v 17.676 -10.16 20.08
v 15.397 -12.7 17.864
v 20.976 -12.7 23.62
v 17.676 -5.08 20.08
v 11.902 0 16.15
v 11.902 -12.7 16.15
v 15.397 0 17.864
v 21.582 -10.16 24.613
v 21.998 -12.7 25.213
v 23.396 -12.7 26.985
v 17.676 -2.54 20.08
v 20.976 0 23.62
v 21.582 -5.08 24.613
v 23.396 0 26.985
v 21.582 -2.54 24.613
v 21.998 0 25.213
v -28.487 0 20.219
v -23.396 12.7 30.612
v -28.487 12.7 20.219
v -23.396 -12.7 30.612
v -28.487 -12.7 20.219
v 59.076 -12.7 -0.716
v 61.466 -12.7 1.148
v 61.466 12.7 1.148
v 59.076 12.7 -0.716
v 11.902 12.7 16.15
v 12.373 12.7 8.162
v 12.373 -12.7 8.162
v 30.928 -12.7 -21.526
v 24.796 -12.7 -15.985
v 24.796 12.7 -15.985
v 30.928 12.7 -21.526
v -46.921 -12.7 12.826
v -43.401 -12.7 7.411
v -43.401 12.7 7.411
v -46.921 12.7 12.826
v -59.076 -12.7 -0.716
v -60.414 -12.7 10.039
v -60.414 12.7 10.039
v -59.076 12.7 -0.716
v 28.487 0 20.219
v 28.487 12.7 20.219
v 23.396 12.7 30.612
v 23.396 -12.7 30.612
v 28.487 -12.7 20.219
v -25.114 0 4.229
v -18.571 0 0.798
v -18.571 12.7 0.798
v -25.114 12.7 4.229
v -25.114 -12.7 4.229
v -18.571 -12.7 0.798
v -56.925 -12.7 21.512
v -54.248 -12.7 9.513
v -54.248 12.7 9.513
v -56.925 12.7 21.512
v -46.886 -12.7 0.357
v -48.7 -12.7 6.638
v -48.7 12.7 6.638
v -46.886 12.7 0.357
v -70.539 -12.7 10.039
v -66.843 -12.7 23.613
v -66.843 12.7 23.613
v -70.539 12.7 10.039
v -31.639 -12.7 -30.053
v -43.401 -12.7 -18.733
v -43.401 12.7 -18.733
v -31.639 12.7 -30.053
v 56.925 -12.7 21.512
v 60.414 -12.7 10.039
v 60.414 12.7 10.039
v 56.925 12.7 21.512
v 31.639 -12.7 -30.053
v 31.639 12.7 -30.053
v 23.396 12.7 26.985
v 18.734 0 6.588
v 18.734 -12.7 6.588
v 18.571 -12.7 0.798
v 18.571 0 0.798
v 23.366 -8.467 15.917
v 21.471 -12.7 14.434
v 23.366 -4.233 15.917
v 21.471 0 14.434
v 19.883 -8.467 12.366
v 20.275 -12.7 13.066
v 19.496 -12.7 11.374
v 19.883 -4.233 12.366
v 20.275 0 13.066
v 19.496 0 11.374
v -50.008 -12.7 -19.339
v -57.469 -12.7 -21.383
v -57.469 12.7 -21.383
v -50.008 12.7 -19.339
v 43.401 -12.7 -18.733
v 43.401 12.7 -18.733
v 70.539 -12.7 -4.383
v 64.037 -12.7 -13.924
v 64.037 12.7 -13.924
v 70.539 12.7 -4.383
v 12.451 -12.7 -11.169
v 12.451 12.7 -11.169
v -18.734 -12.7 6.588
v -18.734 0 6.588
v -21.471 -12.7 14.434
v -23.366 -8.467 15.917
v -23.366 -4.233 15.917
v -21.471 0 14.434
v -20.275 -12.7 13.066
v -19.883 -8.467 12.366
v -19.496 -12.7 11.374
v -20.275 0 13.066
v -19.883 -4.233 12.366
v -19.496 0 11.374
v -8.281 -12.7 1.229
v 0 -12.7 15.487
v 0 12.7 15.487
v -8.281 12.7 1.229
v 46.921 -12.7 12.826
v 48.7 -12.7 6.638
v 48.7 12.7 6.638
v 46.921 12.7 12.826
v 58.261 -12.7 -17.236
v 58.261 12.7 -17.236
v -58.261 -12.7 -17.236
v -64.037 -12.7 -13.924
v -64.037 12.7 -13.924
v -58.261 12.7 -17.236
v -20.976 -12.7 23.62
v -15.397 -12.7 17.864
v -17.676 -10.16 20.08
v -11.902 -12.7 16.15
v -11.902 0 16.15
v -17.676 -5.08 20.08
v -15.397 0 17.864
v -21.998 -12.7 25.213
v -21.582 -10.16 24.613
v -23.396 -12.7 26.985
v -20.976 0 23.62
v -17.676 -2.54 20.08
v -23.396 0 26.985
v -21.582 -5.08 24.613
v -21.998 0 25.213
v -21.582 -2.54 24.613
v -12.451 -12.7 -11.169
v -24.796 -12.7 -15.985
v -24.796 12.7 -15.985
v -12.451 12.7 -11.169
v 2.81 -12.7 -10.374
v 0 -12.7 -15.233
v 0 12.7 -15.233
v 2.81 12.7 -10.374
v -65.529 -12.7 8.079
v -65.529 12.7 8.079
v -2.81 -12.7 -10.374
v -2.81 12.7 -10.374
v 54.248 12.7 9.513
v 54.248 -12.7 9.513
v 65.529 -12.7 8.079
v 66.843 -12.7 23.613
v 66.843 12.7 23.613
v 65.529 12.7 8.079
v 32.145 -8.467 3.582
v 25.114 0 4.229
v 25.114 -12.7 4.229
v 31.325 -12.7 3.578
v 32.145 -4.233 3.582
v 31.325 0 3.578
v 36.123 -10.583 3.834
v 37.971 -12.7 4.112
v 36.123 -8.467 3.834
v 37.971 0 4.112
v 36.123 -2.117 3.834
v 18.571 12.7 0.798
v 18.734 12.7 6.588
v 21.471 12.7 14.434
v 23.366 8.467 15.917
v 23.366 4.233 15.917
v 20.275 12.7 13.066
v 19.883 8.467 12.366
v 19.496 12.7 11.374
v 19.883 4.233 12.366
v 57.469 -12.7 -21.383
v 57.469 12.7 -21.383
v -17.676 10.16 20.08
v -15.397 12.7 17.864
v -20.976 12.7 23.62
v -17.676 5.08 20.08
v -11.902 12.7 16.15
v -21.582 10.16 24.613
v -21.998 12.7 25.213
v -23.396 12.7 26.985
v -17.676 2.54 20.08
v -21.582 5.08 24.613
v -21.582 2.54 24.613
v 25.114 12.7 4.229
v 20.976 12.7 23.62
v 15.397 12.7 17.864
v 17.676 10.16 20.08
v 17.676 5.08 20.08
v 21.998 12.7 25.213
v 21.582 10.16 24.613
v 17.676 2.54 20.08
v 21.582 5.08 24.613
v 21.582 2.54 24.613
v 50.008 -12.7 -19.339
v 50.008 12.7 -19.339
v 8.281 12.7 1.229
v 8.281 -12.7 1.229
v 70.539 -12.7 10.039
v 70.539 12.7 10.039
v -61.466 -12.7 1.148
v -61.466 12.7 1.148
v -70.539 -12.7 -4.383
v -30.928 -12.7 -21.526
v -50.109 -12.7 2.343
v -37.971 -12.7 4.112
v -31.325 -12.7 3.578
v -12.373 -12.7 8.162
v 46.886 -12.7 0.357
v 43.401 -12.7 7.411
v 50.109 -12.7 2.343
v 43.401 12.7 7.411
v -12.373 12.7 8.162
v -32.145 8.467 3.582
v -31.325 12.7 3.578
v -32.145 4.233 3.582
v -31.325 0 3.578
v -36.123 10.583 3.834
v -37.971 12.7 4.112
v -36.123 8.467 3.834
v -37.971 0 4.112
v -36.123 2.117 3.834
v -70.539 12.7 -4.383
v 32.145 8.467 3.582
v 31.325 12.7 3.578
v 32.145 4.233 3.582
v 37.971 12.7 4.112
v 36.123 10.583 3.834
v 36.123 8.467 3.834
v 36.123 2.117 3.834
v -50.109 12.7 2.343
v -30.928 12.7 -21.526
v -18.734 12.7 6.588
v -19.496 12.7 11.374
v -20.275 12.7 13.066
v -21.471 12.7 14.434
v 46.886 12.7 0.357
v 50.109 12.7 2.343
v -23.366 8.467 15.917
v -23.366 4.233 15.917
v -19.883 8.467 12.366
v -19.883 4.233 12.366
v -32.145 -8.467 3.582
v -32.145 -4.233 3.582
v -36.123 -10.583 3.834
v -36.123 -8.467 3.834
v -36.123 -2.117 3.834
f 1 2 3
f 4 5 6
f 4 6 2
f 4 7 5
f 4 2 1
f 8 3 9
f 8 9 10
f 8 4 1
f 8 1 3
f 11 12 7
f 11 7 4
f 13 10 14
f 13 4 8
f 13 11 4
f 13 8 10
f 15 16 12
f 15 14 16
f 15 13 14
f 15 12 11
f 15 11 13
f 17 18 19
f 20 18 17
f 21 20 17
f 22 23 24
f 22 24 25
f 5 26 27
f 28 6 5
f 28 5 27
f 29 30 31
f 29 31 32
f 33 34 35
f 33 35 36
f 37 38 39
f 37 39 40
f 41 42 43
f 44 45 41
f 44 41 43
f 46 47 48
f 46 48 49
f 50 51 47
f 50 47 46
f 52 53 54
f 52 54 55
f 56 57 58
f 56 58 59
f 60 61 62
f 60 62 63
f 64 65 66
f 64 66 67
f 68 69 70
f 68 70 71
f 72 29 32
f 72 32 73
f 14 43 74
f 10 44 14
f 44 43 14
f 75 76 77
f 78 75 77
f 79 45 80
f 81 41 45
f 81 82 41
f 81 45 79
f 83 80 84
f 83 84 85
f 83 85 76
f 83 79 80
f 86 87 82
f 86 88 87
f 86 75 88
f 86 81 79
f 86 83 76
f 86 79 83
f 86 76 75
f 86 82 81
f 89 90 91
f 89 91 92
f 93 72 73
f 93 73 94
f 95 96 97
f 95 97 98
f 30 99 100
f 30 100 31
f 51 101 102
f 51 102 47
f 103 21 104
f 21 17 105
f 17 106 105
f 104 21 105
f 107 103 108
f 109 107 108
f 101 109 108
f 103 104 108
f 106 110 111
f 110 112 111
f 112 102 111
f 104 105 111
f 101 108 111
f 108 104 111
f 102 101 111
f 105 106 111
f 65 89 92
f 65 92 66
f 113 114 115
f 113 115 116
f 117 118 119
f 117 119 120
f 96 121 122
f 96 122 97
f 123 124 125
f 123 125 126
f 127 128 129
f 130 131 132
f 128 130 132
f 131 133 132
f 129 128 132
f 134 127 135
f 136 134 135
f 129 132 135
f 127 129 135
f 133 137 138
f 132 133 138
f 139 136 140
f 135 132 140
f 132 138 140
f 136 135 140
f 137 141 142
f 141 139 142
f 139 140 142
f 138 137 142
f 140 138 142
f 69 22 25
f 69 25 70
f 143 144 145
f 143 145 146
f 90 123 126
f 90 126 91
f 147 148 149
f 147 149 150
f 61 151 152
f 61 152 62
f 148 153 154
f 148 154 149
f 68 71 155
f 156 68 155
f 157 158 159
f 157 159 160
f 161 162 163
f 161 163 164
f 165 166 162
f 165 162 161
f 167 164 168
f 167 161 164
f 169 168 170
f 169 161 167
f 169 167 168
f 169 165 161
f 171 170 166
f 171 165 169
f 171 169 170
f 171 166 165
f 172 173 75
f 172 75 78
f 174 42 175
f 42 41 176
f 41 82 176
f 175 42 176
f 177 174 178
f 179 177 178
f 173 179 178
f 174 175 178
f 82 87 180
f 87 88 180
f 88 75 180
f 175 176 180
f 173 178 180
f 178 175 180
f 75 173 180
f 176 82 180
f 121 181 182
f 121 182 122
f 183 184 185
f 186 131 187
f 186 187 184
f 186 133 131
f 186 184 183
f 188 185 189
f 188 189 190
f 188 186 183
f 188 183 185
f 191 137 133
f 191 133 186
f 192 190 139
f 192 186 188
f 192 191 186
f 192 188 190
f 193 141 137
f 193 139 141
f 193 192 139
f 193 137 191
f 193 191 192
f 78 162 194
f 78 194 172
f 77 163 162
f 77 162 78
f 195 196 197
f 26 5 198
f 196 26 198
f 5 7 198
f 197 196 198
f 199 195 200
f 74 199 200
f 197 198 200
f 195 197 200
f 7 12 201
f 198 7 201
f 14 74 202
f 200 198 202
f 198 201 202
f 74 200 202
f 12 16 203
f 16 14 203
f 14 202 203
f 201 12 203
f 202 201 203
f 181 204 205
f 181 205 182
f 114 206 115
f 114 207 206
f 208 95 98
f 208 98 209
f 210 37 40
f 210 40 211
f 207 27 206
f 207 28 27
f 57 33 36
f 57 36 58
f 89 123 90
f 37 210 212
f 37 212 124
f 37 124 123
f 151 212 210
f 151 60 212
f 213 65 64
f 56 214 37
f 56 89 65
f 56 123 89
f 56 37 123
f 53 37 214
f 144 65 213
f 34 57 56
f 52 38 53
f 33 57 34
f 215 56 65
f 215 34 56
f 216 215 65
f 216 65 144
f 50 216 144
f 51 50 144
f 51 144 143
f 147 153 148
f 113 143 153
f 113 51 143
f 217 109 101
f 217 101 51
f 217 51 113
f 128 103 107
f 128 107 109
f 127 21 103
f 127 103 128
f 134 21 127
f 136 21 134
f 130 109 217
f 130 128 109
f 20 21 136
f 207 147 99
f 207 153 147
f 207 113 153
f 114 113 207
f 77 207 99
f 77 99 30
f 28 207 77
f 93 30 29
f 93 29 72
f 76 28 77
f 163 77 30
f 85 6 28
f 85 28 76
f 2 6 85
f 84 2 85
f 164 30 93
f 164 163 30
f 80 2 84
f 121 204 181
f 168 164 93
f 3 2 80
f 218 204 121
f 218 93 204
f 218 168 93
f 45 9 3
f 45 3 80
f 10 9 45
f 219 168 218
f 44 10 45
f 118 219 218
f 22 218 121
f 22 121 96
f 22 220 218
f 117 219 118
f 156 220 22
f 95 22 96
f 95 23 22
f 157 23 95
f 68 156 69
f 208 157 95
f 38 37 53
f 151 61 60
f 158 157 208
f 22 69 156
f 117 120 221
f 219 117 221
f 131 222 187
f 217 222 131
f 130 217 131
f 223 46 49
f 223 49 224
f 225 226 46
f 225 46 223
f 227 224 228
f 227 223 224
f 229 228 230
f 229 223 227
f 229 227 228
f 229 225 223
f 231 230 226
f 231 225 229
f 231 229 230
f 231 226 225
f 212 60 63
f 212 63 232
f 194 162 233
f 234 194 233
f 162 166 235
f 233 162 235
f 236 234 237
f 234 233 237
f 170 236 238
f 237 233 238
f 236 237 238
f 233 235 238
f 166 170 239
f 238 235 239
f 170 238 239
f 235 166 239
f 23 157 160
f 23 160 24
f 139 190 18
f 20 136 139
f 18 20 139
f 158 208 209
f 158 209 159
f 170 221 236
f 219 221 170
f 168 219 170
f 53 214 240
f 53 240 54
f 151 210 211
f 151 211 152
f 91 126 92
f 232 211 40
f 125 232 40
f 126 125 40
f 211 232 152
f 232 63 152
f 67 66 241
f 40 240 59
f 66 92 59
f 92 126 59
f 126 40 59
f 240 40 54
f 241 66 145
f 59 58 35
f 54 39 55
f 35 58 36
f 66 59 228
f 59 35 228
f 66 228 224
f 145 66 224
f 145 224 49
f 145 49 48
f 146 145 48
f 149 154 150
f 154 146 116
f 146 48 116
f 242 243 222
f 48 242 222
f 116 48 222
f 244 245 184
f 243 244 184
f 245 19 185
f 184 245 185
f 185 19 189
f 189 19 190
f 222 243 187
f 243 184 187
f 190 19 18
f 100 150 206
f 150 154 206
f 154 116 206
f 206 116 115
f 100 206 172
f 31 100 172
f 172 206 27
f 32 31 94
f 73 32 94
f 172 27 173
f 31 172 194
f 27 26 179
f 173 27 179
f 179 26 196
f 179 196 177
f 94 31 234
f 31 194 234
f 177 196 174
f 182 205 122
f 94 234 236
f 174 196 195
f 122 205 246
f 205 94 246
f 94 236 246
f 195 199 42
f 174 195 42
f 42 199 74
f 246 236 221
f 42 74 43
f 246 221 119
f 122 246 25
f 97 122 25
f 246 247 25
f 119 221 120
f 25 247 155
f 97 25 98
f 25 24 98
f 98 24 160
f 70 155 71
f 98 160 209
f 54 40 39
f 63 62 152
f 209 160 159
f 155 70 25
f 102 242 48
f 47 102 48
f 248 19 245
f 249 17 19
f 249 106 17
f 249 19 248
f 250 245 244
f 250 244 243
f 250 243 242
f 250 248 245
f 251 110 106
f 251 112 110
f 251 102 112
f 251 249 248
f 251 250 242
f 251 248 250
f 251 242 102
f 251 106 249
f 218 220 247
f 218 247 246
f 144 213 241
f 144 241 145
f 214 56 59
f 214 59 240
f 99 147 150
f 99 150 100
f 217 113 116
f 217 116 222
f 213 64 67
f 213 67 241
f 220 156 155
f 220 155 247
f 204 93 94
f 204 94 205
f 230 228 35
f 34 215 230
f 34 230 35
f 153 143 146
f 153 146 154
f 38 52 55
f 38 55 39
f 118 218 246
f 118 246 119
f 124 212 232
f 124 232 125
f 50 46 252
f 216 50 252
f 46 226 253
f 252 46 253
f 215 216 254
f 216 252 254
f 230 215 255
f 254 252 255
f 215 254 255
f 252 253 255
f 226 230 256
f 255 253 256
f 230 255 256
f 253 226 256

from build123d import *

# Parameters (mm, degrees)
F1_DEPTH = 12.7
F2_DEPTH = 12.7


with BuildPart() as f1:
    # F0 (on Front) → F1 (new body)
    with BuildSketch(Plane.XZ):
        with BuildLine():
            Line((8.2811145112, 1.2285960838), (0, 15.4874408618))
            Line((0, 15.4874408618), (-8.2811145112, 1.2285960838))
            Line((-8.2811145112, 1.2285960838), (-12.3727992177, 8.1617282704))
            Line((-12.3727992177, 8.1617282704), (-11.9023714215, 16.1495022476))
            add(Edge.make_bspline(
                [(-11.9023714215, 16.1495022476), (-13.1613517272, 16.6548575419), (-15.5670384726, 17.6205013473), (-17.5333922375, 20.1015797679), (-20.5609874273, 22.6867834573), (-21.4873396412, 24.6462285212), (-22.7265176962, 26.164892306), (-23.3956482261, 26.9849393517)],
                knots=[0, 0, 0, 0, 0.2204500858, 0.4212407827, 0.6411829959, 0.8062462362, 1, 1, 1, 1], degree=3))
            Line((-23.3956482261, 26.9849393517), (-23.3956482261, 30.6120049208))
            Line((-23.3956482261, 30.6120049208), (-28.4874904901, 20.2190671116))
            add(Edge.make_bspline(
                [(-28.4874904901, 20.2190671116), (-26.7351245713, 18.6815123537), (-23.471648253, 15.8180844094), (-18.698489342, 12.765512723), (-18.619259599, 5.307731901), (-18.5713469982, 0.7977882633)],
                knots=[0, 0, 0, 0, 0.3143060786, 0.5853403295, 1, 1, 1, 1], degree=3))
            Line((-18.5713469982, 0.7977882633), (-25.1141153276, 4.229309503))
            add(Edge.make_bspline(
                [(-25.1141153276, 4.229309503), (-27.2113543103, 3.8803000814), (-31.2175880029, 3.2136076751), (-38.0307467331, 4.0171950636), (-37.9710688228, 4.111548475), (-37.9713065922, 4.1118925437)],
                knots=[0, 0, 0, 0, 0.5026791859, 0.9602388224, 0.9760311652, 0.9760311652, 0.9760311652, 0.9760311652], degree=3))
            Line((-37.9713065922, 4.1118925437), (-43.4008166194, 7.4114357121))
            Line((-43.4008166194, 7.4114357121), (-46.9205416739, 12.8263989463))
            Line((-46.9205416739, 12.8263989463), (-48.6997440457, 6.6378694028))
            Line((-48.6997440457, 6.6378694028), (-46.8862317502, 0.3569243418))
            Line((-46.8862317502, 0.3569243418), (-50.1090995967, 2.34253495))
            Line((-50.1090995967, 2.34253495), (-54.2478188872, 9.5133557916))
            Line((-54.2478188872, 9.5133557916), (-56.9247491658, 21.5117353946))
            Line((-56.9247491658, 21.5117353946), (-60.4143179953, 10.0391805172))
            Line((-60.4143179953, 10.0391805172), (-59.0758509934, -0.716338749))
            Line((-59.0758509934, -0.716338749), (-61.4659674466, 1.1479511159))
            Line((-61.4659674466, 1.1479511159), (-65.5291676521, 8.0792857334))
            Line((-65.5291676521, 8.0792857334), (-66.8426156044, 23.612709716))
            Line((-66.8426156044, 23.612709716), (-70.5394372344, 10.0391805172))
            Line((-70.5394372344, 10.0391805172), (-70.5394372344, -4.383392632))
            Line((-70.5394372344, -4.383392632), (-64.0365630388, -13.9240529388))
            Line((-64.0365630388, -13.9240529388), (-58.2605600357, -17.2362215817))
            Line((-58.2605600357, -17.2362215817), (-57.4691556394, -21.3832873851))
            Line((-57.4691556394, -21.3832873851), (-50.0076673925, -19.3392392248))
            Line((-50.0076673925, -19.3392392248), (-43.4008166194, -18.7325309962))
            Line((-43.4008166194, -18.7325309962), (-31.6388532519, -30.0529096276))
            Line((-31.6388532519, -30.0529096276), (-30.9283062816, -21.5263534337))
            Line((-30.9283062816, -21.5263534337), (-24.7964542359, -15.9849915653))
            Line((-24.7964542359, -15.9849915653), (-12.4508133158, -11.1685302109))
            Line((-12.4508133158, -11.1685302109), (-2.8095340822, -10.3738503531))
            Line((-2.8095340822, -10.3738503531), (0, -15.2332289144))
            Line((0, -15.2332289144), (2.8095340822, -10.3738503531))
            Line((2.8095340822, -10.3738503531), (12.4508133158, -11.1685302109))
            Line((12.4508133158, -11.1685302109), (24.7964542359, -15.9849915653))
            Line((24.7964542359, -15.9849915653), (30.9283062816, -21.5263534337))
            Line((30.9283062816, -21.5263534337), (31.6388532519, -30.0529096276))
            Line((31.6388532519, -30.0529096276), (43.4008166194, -18.7325309962))
            Line((43.4008166194, -18.7325309962), (50.0076673925, -19.3392392248))
            Line((50.0076673925, -19.3392392248), (57.4691556394, -21.3832873851))
            Line((57.4691556394, -21.3832873851), (58.2605600357, -17.2362215817))
            Line((58.2605600357, -17.2362215817), (64.0365630388, -13.9240529388))
            Line((64.0365630388, -13.9240529388), (70.5394372344, -4.383392632))
            Line((70.5394372344, -4.383392632), (70.5394372344, 10.0391805172))
            Line((70.5394372344, 10.0391805172), (66.8426156044, 23.612709716))
            Line((66.8426156044, 23.612709716), (65.5291676521, 8.0792857334))
            Line((65.5291676521, 8.0792857334), (61.4659674466, 1.1479511159))
            Line((61.4659674466, 1.1479511159), (59.0758509934, -0.716338749))
            Line((59.0758509934, -0.716338749), (60.4143179953, 10.0391805172))
            Line((60.4143179953, 10.0391805172), (56.9247491658, 21.5117353946))
            Line((56.9247491658, 21.5117353946), (54.2478188872, 9.5133557916))
            Line((54.2478188872, 9.5133557916), (50.1090995967, 2.34253495))
            Line((50.1090995967, 2.34253495), (46.8862317502, 0.3569243418))
            Line((46.8862317502, 0.3569243418), (48.6997440457, 6.6378694028))
            Line((48.6997440457, 6.6378694028), (46.9205416739, 12.8263989463))
            Line((46.9205416739, 12.8263989463), (43.4008166194, 7.4114357121))
            Line((43.4008166194, 7.4114357121), (37.9713065922, 4.1118925437))
            add(Edge.make_bspline(
                [(25.1141153276, 4.229309503), (27.2113543103, 3.8803000814), (31.2175880029, 3.2136076751), (38.0307467331, 4.0171950636), (37.9710688228, 4.111548475), (37.9713065922, 4.1118925437)],
                knots=[0, 0, 0, 0, 0.5026791859, 0.9602388224, 0.9760311652, 0.9760311652, 0.9760311652, 0.9760311652], degree=3))
            Line((25.1141153276, 4.229309503), (18.5713469982, 0.7977882633))
            add(Edge.make_bspline(
                [(28.4874904901, 20.2190671116), (26.7351245713, 18.6815123537), (23.471648253, 15.8180844094), (18.698489342, 12.765512723), (18.619259599, 5.307731901), (18.5713469982, 0.7977882633)],
                knots=[0, 0, 0, 0, 0.3143060786, 0.5853403295, 1, 1, 1, 1], degree=3))
            Line((28.4874904901, 20.2190671116), (23.3956482261, 30.6120049208))
            Line((23.3956482261, 30.6120049208), (23.3956482261, 26.9849393517))
            add(Edge.make_bspline(
                [(11.9023714215, 16.1495022476), (13.1613517272, 16.6548575419), (15.5670384726, 17.6205013473), (17.5333922375, 20.1015797679), (20.5609874273, 22.6867834573), (21.4873396412, 24.6462285212), (22.7265176962, 26.164892306), (23.3956482261, 26.9849393517)],
                knots=[0, 0, 0, 0, 0.2204500858, 0.4212407827, 0.6411829959, 0.8062462362, 1, 1, 1, 1], degree=3))
            Line((11.9023714215, 16.1495022476), (12.3727992177, 8.1617282704))
            Line((12.3727992177, 8.1617282704), (8.2811145112, 1.2285960838))
        make_face()
    extrude(amount=F1_DEPTH)

    # F2 (add): a face of the model
    f2_faces = [f1.faces().sort_by_distance(p)[0] for p in [
        (0, 0, -2.9396699917),
    ]]
    extrude(f2_faces, amount=F2_DEPTH)


solid = f1.part
